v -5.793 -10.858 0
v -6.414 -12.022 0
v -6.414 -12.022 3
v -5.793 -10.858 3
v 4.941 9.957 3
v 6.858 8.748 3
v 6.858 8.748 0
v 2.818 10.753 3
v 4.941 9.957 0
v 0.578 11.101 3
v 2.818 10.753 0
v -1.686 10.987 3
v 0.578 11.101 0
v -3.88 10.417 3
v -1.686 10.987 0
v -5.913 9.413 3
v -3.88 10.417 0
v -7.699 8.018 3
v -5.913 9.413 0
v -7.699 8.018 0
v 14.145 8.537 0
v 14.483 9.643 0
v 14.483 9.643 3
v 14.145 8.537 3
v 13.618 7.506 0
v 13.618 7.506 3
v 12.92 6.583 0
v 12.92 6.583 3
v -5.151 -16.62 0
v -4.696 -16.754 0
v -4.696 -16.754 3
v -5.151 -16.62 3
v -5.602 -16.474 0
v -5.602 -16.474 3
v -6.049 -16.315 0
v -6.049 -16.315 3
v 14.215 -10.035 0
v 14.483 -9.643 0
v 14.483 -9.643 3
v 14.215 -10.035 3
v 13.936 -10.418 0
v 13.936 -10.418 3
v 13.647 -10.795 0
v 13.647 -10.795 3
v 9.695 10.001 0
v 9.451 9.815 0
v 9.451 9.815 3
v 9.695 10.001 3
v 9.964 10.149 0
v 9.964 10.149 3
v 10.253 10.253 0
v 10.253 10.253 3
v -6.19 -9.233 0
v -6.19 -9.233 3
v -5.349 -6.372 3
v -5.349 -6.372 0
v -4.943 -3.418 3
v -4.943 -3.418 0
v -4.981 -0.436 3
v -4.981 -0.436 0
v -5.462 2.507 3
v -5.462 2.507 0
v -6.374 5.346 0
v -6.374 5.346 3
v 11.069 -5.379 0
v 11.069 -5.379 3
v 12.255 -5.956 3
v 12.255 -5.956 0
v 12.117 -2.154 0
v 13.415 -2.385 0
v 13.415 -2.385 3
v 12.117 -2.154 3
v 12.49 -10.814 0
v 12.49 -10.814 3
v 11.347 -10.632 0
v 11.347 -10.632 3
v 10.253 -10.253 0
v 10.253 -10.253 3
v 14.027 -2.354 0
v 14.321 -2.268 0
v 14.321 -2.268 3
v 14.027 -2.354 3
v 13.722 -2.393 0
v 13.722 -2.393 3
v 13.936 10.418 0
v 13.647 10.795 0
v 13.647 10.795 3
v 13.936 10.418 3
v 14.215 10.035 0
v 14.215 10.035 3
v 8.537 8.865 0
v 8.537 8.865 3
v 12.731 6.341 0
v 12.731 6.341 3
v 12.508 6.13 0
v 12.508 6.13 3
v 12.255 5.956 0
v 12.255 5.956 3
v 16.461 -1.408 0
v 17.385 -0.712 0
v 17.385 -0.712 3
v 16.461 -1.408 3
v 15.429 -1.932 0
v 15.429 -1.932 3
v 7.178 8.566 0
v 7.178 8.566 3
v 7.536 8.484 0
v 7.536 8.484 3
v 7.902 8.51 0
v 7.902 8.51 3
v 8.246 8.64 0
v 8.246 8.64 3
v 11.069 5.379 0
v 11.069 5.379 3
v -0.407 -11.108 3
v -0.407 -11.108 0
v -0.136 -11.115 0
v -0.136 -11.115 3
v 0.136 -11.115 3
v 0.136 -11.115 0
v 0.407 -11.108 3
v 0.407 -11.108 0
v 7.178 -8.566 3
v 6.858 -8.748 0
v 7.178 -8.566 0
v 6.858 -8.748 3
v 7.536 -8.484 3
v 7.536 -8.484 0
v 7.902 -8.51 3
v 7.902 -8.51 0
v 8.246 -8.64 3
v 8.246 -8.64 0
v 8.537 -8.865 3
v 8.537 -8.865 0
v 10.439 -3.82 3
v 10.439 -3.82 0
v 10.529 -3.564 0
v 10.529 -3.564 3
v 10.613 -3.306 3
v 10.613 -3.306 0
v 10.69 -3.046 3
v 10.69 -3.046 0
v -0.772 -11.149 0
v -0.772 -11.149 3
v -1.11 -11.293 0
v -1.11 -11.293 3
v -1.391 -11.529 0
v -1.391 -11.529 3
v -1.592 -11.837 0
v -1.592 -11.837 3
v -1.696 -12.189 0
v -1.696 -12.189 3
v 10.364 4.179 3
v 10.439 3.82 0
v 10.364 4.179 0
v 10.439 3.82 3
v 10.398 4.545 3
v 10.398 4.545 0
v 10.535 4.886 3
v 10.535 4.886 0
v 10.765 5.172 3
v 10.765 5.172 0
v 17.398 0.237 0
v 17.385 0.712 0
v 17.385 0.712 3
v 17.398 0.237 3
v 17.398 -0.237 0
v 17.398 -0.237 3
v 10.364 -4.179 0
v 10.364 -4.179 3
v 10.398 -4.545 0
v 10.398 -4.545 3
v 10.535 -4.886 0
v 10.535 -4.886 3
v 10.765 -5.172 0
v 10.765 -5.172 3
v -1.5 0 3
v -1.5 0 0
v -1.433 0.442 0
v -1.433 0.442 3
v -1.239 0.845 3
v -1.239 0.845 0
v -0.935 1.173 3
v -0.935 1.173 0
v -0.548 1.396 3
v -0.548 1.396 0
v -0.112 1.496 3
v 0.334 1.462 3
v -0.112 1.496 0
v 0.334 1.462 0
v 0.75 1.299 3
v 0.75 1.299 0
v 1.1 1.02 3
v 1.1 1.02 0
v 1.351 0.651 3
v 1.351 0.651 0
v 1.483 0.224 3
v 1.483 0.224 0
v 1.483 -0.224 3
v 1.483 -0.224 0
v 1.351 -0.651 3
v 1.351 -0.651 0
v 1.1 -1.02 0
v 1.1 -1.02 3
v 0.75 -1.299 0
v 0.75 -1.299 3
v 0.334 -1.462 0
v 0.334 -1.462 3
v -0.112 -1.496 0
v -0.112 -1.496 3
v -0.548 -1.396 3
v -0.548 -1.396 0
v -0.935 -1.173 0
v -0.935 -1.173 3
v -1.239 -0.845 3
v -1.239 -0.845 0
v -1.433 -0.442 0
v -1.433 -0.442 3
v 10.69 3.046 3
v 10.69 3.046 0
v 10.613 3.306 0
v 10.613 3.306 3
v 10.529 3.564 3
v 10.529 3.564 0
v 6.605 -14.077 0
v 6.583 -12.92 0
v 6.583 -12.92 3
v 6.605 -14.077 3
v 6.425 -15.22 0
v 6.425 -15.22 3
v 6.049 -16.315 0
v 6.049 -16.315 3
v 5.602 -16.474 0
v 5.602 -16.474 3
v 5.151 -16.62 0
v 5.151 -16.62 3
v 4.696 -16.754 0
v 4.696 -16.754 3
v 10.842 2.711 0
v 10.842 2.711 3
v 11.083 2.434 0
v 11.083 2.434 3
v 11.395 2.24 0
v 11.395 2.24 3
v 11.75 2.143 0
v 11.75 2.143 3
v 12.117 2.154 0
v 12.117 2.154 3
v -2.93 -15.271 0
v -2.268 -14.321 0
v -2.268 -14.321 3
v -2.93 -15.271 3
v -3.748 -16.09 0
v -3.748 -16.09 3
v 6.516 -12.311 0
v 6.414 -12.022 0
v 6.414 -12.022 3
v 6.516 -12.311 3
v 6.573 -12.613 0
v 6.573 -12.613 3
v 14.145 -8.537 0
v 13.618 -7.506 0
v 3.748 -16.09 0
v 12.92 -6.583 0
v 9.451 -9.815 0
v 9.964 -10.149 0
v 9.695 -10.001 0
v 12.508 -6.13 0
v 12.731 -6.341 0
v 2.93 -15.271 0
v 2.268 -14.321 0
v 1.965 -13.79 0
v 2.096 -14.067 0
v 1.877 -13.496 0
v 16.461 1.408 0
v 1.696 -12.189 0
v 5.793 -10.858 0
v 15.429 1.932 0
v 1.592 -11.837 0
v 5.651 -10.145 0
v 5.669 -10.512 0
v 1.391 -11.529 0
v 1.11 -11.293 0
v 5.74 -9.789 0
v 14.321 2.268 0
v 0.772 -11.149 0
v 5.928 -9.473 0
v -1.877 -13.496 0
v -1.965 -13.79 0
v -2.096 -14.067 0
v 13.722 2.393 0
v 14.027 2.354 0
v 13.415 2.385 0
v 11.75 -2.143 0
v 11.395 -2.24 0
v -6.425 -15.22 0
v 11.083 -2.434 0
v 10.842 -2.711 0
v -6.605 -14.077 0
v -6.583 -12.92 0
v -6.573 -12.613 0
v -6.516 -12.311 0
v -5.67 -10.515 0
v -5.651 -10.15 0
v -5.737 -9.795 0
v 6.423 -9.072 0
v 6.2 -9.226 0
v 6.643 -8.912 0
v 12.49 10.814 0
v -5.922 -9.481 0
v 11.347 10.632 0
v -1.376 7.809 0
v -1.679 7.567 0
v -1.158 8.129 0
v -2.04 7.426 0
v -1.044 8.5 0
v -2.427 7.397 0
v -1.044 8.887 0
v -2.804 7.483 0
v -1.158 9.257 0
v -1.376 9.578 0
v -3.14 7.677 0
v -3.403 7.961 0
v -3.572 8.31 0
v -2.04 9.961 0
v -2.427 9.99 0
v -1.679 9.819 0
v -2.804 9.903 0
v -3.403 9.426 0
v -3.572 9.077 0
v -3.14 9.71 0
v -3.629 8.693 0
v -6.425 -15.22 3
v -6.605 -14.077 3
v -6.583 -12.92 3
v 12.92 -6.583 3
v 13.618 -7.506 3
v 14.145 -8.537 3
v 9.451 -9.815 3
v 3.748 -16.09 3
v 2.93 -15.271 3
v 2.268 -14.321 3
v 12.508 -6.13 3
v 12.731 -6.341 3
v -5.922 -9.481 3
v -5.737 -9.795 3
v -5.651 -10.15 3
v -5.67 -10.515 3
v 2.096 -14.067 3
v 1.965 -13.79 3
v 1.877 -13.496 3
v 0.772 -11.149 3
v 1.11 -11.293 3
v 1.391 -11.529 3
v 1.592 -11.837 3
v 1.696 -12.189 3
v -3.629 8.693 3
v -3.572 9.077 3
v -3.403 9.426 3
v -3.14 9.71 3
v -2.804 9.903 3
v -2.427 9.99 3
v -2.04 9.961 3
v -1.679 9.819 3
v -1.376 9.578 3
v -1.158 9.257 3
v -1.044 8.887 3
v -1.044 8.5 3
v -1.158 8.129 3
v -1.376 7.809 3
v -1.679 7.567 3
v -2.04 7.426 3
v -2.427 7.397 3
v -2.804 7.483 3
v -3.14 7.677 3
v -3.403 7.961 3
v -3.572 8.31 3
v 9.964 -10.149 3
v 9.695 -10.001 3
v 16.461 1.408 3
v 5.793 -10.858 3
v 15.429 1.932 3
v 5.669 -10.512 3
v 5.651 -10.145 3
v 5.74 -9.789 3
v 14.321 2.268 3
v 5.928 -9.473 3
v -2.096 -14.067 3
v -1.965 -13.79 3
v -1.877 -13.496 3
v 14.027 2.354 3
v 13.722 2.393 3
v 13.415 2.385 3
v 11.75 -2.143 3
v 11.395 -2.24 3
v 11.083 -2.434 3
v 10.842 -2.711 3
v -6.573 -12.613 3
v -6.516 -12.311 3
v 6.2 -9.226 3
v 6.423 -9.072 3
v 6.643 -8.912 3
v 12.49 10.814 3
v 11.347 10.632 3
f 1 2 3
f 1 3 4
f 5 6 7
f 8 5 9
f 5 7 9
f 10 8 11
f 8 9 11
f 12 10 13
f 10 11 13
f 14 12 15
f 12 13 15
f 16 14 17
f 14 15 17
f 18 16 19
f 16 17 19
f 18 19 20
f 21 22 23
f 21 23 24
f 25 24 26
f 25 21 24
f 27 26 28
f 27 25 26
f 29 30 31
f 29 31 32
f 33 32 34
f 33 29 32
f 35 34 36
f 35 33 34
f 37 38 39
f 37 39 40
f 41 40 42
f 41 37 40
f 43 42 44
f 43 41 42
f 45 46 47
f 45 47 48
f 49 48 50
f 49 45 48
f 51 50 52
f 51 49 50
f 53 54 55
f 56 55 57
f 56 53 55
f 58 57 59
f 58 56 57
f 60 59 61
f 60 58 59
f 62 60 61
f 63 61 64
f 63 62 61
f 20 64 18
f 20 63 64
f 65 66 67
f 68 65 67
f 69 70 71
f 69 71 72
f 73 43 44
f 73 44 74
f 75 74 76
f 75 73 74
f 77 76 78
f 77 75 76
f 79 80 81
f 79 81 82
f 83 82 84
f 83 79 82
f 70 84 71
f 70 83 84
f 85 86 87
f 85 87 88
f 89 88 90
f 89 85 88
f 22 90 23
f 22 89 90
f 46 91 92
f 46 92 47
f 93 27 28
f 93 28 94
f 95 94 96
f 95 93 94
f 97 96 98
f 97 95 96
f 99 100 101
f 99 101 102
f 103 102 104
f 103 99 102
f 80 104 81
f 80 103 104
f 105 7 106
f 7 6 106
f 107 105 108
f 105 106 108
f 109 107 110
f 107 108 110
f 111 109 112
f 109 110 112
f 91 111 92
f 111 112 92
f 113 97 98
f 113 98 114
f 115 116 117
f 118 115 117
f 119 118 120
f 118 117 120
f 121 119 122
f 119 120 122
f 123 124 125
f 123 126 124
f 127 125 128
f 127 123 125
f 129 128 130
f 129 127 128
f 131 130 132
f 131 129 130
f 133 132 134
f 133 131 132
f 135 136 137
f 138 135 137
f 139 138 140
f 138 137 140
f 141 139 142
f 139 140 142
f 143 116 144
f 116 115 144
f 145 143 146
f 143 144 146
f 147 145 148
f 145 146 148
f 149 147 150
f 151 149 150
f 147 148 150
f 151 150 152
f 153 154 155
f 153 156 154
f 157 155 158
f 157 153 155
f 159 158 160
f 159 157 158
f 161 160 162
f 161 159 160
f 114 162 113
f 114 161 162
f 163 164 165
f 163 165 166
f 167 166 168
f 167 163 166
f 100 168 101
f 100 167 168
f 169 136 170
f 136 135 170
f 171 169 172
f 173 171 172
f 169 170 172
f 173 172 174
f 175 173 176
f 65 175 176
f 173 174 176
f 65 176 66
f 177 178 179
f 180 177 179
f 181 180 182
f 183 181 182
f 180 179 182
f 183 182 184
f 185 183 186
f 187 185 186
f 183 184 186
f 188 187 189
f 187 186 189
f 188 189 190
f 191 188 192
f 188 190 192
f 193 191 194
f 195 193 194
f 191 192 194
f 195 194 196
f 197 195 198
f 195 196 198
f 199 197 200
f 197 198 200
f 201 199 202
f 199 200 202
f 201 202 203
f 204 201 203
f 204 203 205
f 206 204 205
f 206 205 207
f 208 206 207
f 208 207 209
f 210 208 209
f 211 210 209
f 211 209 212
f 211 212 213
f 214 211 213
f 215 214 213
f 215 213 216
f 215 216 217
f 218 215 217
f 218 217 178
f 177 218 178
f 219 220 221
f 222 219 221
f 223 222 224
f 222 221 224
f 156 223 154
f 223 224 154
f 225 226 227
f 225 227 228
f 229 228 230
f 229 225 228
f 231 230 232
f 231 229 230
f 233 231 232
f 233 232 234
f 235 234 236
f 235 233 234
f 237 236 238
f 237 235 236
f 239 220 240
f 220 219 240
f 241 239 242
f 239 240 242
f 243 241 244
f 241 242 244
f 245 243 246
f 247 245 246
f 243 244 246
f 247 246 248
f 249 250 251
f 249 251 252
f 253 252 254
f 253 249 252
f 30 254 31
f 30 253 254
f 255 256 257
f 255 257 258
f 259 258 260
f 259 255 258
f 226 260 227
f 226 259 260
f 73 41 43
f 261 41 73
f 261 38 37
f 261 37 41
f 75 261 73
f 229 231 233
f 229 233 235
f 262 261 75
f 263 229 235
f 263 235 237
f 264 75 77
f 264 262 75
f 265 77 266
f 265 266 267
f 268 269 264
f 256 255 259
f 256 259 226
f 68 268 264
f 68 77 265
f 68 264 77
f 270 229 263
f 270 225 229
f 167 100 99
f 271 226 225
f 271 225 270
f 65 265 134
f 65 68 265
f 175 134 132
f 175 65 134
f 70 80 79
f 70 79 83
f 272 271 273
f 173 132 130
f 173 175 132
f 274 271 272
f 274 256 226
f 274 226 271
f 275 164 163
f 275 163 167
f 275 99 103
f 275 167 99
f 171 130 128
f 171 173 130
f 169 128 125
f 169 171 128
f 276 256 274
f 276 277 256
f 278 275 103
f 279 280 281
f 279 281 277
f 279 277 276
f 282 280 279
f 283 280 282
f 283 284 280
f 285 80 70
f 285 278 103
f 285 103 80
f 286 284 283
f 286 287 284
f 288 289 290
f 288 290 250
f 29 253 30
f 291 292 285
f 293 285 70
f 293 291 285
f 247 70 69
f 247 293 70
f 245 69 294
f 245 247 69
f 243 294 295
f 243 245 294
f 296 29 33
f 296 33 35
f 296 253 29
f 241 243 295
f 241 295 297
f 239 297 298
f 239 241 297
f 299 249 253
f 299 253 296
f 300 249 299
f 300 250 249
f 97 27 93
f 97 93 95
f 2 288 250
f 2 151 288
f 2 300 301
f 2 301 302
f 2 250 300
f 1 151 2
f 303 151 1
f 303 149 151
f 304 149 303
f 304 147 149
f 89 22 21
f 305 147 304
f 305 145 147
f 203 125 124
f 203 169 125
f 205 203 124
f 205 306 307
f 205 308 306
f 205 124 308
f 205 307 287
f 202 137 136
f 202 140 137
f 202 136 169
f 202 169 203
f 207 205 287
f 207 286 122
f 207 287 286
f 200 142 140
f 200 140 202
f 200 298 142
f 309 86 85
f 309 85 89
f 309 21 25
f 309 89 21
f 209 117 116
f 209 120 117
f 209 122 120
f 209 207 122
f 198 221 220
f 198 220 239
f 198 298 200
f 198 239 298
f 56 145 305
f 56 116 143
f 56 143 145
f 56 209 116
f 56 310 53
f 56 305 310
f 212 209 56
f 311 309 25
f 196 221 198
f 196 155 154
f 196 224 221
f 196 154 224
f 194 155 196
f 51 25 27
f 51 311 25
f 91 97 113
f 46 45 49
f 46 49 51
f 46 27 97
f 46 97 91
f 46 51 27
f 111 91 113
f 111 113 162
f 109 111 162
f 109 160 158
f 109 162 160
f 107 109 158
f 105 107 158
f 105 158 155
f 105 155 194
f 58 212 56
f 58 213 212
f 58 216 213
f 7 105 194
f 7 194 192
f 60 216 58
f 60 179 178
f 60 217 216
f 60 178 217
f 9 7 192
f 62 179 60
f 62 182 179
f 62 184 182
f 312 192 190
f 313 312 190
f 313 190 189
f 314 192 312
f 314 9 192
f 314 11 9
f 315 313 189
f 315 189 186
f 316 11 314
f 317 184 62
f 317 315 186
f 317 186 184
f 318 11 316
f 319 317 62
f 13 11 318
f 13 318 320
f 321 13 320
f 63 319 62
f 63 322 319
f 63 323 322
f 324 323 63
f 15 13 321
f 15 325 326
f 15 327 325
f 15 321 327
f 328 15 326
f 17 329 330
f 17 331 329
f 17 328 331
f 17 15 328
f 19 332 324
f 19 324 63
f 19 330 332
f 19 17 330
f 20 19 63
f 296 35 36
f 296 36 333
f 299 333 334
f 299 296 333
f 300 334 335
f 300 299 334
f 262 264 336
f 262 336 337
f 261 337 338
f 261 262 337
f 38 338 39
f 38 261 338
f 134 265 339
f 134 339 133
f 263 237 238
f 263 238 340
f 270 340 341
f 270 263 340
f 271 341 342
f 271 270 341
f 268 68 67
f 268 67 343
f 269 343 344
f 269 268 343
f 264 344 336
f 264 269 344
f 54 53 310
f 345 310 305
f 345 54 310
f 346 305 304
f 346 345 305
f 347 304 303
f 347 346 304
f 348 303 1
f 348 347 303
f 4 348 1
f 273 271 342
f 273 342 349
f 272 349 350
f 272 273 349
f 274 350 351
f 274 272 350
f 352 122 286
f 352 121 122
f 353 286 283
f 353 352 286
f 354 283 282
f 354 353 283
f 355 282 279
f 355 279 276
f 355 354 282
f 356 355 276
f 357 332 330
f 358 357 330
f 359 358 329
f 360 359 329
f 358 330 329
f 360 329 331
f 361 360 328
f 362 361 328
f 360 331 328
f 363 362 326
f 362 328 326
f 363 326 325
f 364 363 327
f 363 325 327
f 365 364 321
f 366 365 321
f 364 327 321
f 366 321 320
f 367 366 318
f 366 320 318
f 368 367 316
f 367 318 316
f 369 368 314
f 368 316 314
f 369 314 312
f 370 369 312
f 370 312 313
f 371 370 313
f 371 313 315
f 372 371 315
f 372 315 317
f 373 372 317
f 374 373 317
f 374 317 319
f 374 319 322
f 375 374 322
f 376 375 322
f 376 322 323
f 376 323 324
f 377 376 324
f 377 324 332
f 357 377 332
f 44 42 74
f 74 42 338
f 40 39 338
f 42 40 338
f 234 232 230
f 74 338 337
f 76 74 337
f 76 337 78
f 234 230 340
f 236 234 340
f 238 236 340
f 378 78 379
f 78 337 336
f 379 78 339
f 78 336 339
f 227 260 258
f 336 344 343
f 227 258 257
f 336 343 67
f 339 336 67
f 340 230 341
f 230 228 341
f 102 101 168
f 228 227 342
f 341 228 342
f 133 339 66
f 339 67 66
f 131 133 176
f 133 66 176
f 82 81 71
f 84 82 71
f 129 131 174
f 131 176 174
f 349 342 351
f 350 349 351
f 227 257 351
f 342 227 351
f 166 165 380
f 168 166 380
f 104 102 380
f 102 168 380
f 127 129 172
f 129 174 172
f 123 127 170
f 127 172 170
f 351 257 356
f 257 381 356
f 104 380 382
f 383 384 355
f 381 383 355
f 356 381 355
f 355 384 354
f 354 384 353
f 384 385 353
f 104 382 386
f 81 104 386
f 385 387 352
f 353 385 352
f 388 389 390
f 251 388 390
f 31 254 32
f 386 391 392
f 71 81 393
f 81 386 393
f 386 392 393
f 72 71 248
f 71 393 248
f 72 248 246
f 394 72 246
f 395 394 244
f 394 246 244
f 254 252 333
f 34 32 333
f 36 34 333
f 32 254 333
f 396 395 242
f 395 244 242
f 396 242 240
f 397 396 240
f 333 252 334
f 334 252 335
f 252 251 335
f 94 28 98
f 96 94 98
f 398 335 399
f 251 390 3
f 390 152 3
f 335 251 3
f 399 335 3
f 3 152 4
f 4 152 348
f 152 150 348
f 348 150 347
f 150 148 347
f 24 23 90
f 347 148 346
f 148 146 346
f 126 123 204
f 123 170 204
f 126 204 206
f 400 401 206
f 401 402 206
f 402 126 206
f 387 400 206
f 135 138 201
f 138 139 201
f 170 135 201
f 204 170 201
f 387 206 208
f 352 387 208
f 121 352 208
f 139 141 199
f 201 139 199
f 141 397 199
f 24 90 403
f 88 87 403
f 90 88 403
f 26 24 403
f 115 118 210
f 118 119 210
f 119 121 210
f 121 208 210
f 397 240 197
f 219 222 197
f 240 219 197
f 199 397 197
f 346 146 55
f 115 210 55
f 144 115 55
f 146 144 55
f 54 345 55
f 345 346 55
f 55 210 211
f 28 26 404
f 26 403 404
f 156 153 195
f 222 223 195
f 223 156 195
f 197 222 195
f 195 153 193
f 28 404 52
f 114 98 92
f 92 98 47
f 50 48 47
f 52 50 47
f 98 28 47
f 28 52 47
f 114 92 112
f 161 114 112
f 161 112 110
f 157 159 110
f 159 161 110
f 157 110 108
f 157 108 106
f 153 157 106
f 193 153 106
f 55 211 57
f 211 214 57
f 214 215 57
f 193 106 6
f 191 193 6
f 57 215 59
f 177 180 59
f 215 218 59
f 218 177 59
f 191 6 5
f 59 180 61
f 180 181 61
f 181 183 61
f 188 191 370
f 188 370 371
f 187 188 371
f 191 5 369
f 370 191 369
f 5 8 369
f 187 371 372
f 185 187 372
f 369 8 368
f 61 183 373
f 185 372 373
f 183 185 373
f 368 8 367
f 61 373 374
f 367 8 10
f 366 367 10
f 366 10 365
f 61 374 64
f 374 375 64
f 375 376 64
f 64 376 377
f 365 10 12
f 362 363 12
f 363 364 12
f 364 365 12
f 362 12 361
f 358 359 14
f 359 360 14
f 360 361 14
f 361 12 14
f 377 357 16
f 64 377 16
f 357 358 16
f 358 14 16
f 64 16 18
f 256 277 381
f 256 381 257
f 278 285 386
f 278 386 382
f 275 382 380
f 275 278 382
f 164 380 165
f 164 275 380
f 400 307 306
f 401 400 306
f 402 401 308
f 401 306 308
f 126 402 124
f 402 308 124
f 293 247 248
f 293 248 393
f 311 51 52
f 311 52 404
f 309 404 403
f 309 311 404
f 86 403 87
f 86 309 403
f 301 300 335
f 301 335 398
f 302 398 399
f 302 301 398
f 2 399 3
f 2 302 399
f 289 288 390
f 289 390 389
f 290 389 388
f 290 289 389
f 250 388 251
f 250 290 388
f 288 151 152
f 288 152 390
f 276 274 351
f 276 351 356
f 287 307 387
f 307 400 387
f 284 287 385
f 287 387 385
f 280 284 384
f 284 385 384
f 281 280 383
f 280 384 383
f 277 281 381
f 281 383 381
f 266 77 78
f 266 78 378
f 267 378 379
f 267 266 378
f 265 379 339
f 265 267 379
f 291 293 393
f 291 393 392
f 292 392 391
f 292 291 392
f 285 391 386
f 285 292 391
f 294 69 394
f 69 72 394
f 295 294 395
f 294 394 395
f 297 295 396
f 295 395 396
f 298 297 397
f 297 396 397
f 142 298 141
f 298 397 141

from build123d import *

# Parameters (mm, degrees)
POSICIONAMENTOS_R               = 11.1157
BASE_DEPTH                      = 3
FURO_DE_DI_METRO_2_6_2_6_1_D    = 2.6
BASE_DENTE_DEPTH                = 3
RAIO_DENTE_R                    = 1.254921501
PADR_OCIRCULAR1_COUNT           = 10
RAIO_DENTE_OF_PADR_OCIRCULAR1_R = 1.254921501
FURO_DE_DI_METRO_3_0_3_1_D      = 3
ESBO_O9_R                       = 20
CORTE_EXTRUS_O1_DEPTH           = 25.340719016


with BuildPart() as part:
    # Posicionamentos → Base (new body)
    with BuildSketch(Plane.XY):
        Circle(POSICIONAMENTOS_R)
    extrude(amount=BASE_DEPTH)

    # Furo de diâmetro Ø2.6 (2.6)1 (through all)
    with Locations(Plane.XY.offset(3)):
        with Locations((-2.329371406, 8.693332437)):
            Hole(FURO_DE_DI_METRO_2_6_2_6_1_D / 2)

    # Dente → Base Dente (add, through all)
    with BuildSketch(Plane.XY):
        with BuildLine():
            Line((13.415210536, -2.384858144), (10.944111052, -1.945564126))
            ThreePointArc((10.944111052, -1.945564126), (11.1157, 0), (10.944111052, 1.945564126))
            Line((10.944111052, 1.945564126), (13.415210536, 2.384858144))
            ThreePointArc((13.415210536, 2.384858144), (13.875087923, 2.379001106), (14.321480939, 2.268299743))
            ThreePointArc((14.321480939, 2.268299743), (15.956376882, 1.692474606), (17.385445174, 0.711544868))
            ThreePointArc((17.385445174, 0.711544868), (17.4, 0), (17.385445174, -0.711544868))
            ThreePointArc((17.385445174, -0.711544868), (15.956376882, -1.692474606), (14.321480939, -2.268299743))
            ThreePointArc((14.321480939, -2.268299743), (13.875087923, -2.379001106), (13.415210536, -2.384858144))
        make_face()
    base_dente = extrude(amount=BASE_DENTE_DEPTH)

    # Raio Dente
    raio_dente_edges = [part.edges().sort_by_distance(p)[0] for p in [
        (10.944111052, 1.945564126, 1.5),
        (10.944111052, -1.945564126, 1.5),
    ]]
    fillet(raio_dente_edges, radius=RAIO_DENTE_R)

    # PadrãoCircular1: Base Dente ×10 about axis, 5 skipped
    padr_ocircular1_axis = Axis((0, 0, 0), (0, 0, -1))
    add([base_dente.rotate(padr_ocircular1_axis, i * 360 / PADR_OCIRCULAR1_COUNT) for i in range(1, PADR_OCIRCULAR1_COUNT) if i not in (4, 5, 6, 7, 8)])

    # Raio Dente of PadrãoCircular1
    raio_dente_of_padr_ocircular1_edges = [part.edges().sort_by_distance(p)[0] for p in [
        (9.99754573, -4.858792634, 1.5),
        (7.710397929, -8.006781518, 1.5),
        (5.232257744, -9.807255752, 1.5),
        (1.531574863, -11.00968051, 1.5),
        (-1.531574863, -11.00968051, 1.5),
        (-5.232257744, -9.807255752, 1.5),
        (7.710397929, 8.006781518, 1.5),
        (9.99754573, 4.858792634, 1.5),
    ]]
    fillet(raio_dente_of_padr_ocircular1_edges, radius=RAIO_DENTE_OF_PADR_OCIRCULAR1_R)

    # Furo de diâmetro Ø3.0 (3)1 (through all)
    with Locations(Plane.XY.offset(3)):
        with Locations((0, 0)):
            Hole(FURO_DE_DI_METRO_3_0_3_1_D / 2)

    # Esboço9 → Corte-extrusão1 (cut, through all)
    with BuildSketch(Plane.XY):
        with Locations((-24.904867452, -2.178893569)):
            Circle(ESBO_O9_R)
    extrude(amount=CORTE_EXTRUS_O1_DEPTH, mode=Mode.SUBTRACT)


solid = part.part
